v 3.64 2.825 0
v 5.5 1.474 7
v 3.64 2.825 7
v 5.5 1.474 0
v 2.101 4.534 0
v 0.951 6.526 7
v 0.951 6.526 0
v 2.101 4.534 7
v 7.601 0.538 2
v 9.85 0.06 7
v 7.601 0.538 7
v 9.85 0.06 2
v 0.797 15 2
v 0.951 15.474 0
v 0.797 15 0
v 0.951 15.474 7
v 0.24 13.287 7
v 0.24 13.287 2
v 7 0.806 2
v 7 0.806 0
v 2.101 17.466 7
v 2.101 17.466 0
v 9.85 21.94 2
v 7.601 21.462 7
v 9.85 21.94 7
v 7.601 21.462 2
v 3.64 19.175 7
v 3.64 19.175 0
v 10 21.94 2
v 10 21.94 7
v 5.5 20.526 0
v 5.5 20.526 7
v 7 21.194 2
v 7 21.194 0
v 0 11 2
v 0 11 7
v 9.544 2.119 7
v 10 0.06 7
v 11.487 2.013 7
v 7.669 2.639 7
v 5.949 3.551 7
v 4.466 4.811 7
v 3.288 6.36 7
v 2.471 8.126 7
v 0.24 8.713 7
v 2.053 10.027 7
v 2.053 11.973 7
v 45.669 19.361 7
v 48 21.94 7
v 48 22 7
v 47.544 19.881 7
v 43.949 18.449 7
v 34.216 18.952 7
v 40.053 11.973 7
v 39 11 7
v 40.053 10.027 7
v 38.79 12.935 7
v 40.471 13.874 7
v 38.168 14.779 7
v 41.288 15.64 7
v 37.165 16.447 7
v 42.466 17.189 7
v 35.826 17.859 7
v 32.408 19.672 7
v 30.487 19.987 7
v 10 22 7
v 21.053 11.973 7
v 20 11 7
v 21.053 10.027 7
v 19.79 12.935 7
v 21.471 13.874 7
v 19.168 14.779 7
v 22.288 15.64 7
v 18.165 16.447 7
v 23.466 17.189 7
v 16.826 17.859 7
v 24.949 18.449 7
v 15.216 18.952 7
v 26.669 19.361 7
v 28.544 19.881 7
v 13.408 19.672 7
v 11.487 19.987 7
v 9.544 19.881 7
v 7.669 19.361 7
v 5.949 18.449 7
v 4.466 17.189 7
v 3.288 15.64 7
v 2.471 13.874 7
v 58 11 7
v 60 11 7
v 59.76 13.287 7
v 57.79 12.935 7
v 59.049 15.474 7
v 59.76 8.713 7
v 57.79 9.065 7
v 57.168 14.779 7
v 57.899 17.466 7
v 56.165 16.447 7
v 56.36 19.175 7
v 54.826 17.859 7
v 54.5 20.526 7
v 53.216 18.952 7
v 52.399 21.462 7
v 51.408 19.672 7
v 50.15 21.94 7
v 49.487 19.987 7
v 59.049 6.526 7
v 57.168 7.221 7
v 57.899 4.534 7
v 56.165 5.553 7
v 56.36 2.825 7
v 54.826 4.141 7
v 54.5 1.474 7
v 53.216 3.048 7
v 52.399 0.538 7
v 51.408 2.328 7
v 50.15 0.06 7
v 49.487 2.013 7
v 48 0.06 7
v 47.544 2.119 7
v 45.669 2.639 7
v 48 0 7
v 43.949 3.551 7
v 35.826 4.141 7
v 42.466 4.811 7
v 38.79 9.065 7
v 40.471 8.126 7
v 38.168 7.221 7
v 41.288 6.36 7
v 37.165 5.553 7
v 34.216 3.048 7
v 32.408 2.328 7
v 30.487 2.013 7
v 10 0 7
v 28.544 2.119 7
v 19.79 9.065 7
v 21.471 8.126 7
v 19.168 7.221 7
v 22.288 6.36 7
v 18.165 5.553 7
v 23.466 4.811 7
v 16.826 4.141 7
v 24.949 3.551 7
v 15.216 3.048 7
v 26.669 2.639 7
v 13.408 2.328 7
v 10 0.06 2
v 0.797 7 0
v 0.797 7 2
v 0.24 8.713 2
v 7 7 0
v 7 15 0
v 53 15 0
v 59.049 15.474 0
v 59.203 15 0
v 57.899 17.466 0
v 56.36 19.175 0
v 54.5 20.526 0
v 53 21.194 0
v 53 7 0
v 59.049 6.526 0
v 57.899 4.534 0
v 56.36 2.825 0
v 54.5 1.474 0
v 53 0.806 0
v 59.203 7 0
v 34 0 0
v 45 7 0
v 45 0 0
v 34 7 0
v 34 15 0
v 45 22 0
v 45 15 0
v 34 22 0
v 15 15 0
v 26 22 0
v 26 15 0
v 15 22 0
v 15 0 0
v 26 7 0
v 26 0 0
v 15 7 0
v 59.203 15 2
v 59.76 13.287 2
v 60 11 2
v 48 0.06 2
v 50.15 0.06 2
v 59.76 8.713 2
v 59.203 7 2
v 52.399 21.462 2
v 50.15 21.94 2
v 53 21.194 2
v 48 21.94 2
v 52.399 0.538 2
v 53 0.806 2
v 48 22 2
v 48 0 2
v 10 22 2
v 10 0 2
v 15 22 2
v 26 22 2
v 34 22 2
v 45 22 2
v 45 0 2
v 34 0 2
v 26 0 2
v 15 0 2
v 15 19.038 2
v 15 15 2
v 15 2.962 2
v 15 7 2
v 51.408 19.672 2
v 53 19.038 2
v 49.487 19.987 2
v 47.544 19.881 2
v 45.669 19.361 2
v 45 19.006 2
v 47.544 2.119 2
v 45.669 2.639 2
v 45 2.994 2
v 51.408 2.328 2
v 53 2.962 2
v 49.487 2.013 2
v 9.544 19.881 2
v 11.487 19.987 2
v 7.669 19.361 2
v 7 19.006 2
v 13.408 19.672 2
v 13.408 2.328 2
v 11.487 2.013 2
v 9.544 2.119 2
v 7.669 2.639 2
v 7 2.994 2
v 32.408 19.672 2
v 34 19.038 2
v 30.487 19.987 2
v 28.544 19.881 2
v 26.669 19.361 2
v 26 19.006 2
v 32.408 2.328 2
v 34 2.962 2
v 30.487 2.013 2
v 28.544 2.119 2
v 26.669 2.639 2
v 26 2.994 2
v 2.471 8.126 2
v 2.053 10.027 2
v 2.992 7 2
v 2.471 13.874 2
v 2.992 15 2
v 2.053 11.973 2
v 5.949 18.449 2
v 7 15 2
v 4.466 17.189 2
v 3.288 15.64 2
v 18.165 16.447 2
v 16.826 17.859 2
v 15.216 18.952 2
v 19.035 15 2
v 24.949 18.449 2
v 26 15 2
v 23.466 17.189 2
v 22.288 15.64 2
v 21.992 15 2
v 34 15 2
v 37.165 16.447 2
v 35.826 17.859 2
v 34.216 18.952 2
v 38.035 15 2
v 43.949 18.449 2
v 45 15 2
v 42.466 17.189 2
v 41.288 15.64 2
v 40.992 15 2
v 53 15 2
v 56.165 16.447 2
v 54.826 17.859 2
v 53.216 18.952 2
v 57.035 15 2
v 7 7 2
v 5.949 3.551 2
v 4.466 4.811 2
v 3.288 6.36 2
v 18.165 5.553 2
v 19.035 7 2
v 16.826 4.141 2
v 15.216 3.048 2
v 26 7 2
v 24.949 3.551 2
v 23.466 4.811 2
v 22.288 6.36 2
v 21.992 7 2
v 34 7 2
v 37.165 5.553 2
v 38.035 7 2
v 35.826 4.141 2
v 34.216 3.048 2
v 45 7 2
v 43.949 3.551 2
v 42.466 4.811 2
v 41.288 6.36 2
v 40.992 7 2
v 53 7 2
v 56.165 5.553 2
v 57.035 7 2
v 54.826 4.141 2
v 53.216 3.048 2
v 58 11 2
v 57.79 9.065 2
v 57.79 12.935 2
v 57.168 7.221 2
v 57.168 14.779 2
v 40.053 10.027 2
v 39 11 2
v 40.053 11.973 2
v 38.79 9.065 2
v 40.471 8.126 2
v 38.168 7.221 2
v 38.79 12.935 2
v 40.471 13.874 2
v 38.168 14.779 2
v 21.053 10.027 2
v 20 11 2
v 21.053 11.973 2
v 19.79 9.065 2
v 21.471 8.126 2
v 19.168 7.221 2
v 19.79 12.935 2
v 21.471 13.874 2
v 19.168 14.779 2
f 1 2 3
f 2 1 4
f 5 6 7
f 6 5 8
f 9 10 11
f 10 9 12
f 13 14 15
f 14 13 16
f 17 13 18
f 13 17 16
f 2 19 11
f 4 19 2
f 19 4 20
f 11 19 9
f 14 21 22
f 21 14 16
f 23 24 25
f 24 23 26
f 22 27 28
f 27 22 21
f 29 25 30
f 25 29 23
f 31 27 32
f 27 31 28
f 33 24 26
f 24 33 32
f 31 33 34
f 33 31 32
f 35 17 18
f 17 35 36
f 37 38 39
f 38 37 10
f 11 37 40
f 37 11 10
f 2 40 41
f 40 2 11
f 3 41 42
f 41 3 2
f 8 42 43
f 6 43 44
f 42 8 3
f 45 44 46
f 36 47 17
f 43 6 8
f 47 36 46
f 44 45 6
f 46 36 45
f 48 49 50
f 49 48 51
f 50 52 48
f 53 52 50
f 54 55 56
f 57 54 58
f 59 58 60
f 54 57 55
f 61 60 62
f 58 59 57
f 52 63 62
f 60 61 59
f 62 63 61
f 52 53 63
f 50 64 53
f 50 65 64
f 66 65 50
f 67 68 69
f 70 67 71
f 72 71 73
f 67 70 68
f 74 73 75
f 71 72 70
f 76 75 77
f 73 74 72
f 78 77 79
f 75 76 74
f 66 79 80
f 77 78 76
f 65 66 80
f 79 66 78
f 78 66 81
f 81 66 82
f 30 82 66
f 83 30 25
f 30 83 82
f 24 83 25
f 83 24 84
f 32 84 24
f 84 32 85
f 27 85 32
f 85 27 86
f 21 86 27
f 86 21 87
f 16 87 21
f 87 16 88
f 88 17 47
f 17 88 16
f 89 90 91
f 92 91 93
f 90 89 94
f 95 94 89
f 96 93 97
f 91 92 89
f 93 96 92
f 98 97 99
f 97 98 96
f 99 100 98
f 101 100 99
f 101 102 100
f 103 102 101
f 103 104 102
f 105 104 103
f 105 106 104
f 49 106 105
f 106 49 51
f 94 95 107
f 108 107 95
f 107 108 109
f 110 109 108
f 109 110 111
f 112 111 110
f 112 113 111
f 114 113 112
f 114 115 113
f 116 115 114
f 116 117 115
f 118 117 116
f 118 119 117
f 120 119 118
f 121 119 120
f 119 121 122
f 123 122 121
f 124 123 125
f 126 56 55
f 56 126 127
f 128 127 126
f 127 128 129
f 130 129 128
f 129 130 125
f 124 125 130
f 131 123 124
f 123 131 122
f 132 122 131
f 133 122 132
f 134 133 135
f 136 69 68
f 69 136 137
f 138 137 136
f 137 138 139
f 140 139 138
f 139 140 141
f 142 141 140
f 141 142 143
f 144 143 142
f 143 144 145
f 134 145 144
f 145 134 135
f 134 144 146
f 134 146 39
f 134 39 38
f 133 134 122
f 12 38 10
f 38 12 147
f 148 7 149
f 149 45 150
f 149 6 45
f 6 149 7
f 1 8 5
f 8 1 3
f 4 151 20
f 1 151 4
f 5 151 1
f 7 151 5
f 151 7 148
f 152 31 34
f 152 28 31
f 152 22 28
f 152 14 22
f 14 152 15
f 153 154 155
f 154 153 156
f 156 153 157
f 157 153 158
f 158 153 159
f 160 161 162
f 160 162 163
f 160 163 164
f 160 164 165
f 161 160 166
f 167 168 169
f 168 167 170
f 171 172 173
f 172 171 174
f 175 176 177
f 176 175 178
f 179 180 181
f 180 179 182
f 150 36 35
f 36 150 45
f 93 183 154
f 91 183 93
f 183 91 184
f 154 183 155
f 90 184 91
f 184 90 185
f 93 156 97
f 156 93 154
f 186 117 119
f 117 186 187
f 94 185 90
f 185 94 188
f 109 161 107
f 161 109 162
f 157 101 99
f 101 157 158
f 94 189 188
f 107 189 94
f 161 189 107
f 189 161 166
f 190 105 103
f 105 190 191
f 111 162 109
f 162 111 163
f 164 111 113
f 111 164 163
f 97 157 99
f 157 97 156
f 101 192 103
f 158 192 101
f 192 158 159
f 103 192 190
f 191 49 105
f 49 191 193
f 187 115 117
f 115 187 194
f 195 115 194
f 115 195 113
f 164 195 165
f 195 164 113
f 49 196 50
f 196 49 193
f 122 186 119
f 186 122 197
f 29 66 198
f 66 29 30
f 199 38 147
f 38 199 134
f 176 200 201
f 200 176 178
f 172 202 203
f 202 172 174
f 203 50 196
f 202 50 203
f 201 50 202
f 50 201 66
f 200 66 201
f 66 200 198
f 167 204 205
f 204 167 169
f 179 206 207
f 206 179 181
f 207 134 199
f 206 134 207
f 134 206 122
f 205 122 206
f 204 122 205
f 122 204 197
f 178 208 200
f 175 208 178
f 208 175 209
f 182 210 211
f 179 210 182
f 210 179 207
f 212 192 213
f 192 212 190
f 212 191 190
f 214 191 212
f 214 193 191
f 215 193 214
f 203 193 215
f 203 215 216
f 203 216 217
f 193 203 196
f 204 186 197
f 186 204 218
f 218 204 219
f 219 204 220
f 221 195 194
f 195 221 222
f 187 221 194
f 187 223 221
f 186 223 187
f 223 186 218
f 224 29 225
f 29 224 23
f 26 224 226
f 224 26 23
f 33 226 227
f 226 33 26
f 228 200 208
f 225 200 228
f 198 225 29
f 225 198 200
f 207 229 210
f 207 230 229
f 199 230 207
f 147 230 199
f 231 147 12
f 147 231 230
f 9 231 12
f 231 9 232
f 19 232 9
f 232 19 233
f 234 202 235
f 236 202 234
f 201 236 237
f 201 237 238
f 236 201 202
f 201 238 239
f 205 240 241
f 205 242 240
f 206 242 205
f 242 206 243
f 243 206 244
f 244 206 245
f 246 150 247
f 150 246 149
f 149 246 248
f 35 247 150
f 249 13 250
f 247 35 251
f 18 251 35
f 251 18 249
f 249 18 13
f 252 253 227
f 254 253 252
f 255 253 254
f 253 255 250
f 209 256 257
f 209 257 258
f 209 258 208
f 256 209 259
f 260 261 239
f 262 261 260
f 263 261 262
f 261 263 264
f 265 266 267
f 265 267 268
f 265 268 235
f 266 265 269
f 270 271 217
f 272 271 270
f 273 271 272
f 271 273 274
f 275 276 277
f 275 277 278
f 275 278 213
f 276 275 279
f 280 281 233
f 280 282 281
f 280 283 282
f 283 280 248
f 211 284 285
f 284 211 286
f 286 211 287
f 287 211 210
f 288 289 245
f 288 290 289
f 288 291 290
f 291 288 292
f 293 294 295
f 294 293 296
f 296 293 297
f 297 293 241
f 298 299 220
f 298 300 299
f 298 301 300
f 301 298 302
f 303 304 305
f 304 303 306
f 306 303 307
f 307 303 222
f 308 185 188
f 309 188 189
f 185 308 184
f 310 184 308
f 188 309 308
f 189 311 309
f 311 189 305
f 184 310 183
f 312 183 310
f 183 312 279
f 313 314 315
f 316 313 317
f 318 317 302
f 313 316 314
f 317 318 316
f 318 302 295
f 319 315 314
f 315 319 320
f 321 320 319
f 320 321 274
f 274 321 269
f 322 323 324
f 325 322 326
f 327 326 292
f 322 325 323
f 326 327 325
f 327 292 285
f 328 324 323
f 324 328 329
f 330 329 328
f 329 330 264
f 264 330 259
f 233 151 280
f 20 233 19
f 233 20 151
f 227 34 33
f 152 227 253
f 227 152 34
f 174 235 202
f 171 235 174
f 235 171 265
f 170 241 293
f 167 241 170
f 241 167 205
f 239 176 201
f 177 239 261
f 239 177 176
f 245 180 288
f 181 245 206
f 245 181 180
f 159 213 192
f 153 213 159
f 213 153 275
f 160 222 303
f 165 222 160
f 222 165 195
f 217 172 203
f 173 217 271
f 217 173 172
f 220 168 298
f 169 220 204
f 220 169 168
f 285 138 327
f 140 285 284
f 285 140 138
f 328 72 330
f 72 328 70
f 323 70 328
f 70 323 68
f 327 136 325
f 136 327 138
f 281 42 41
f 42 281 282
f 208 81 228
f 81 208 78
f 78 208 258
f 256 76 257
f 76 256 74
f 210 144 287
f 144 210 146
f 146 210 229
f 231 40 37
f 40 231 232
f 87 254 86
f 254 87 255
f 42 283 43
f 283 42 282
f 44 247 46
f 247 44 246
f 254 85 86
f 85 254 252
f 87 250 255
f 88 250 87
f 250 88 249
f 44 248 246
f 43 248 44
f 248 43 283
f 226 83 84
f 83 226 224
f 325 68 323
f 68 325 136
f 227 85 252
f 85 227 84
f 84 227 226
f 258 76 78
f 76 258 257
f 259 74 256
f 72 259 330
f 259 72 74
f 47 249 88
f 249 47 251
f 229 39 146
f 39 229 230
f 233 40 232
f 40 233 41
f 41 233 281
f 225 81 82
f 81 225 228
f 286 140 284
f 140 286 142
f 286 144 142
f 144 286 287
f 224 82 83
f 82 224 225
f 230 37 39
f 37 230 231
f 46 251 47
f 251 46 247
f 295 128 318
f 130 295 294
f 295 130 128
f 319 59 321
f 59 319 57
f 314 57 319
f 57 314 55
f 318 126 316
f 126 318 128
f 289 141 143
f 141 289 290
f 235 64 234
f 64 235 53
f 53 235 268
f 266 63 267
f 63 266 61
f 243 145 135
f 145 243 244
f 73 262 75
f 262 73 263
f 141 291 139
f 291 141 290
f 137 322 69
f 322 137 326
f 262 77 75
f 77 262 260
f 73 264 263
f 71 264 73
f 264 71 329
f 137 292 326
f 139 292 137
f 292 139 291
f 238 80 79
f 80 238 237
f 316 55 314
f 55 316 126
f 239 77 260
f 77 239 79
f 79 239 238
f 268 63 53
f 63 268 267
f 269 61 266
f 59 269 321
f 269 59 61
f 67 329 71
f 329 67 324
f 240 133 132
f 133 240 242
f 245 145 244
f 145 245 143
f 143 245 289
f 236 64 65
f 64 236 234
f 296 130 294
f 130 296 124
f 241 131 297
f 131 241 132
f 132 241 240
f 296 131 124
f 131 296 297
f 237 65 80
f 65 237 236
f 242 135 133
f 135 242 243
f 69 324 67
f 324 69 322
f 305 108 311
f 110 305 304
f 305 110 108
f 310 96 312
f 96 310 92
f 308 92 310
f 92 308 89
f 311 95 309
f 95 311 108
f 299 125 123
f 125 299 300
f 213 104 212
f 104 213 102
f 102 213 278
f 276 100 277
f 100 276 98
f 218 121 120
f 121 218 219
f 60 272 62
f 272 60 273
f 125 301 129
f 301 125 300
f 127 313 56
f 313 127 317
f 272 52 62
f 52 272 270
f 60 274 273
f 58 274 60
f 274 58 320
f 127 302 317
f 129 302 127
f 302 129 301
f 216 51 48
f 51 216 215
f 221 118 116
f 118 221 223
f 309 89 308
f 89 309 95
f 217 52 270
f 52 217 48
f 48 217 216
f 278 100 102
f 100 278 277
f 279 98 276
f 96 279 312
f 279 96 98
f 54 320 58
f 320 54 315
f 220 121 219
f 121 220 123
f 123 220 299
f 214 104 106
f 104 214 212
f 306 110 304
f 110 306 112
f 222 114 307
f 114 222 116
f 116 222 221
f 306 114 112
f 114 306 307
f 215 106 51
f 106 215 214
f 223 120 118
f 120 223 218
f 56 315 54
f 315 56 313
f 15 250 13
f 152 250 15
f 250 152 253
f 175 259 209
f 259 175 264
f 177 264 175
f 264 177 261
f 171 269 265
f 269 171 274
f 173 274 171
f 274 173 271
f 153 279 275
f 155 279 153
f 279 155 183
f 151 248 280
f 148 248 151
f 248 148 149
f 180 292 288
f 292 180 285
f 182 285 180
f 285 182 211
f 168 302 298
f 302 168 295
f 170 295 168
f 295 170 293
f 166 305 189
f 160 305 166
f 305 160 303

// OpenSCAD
// Copyright 2018 Marcos Del Sol Vives
// SPDX-License-Identifier: ISC

x_count = 3;
y_count = 1;

battery_diameter = 18;
battery_padding = 1;

guide_height = 2;

tab_height = 5;

guide_width = 8;

wall_thickness = 2;

total_width = (battery_diameter + battery_padding) * x_count - battery_padding + 2 * wall_thickness;
total_height = (battery_diameter + battery_padding) * y_count - battery_padding + 2 * wall_thickness;
total_depth = tab_height + guide_height;

difference() {
	union() {
		// Round corners
		translate([
			wall_thickness + battery_diameter / 2,
			wall_thickness + battery_diameter / 2
		]) {
			// Bottom left
			cylinder(d = wall_thickness * 2 + battery_diameter, h = total_depth);

			// Bottom right
			translate([
				(battery_padding + battery_diameter) * (x_count - 1),
				0
			])
				#cylinder(d = wall_thickness * 2 + battery_diameter, h = total_depth);

			// Top right
			translate([
				(battery_padding + battery_diameter) * (x_count - 1),
				(battery_padding + battery_diameter) * (y_count - 1),
			])
				cylinder(d = wall_thickness * 2 + battery_diameter, h = total_depth);

			// Top left
			translate([
				0,
				(battery_padding + battery_diameter) * (y_count - 1),
			])
				cylinder(d = wall_thickness * 2 + battery_diameter, h = total_depth);
		}

		// Wide part
		translate([
			0,
			battery_padding + battery_diameter / 2
		]) {
			cube([
				total_width,
				(battery_diameter + battery_padding) * (y_count - 1),
				total_depth
			]);
		}

		// Tall part
		translate([
			battery_padding + battery_diameter / 2,
			0
		]) {
			cube([
				(battery_diameter + battery_padding) * (x_count - 1),
				total_height,
				total_depth
			]);
		}
	}

	// Columns
	for (x = [0 : x_count - 1]) {
		translate([x * (battery_diameter + battery_padding) + battery_diameter / 2 - guide_width / 2 + wall_thickness, 0])
			cube([guide_width, total_height, guide_height	]);
	}
	// Rows
	for (y = [0 : y_count - 1]) {
		translate([0, y * (battery_diameter + battery_padding) + battery_diameter / 2 - guide_width / 2 + wall_thickness])
			cube([total_width, guide_width, guide_height	]);
	}

	for (x = [0 : x_count - 1]) {
		for (y = [0 : y_count - 1]) {
			translate([
				(x + 0.5) * battery_diameter + battery_padding * x + wall_thickness,
				(y + 0.5) * battery_diameter + battery_padding * y + wall_thickness,
				guide_height	
			])
				cylinder(d = battery_diameter, h = tab_height);
		}
	}
}
